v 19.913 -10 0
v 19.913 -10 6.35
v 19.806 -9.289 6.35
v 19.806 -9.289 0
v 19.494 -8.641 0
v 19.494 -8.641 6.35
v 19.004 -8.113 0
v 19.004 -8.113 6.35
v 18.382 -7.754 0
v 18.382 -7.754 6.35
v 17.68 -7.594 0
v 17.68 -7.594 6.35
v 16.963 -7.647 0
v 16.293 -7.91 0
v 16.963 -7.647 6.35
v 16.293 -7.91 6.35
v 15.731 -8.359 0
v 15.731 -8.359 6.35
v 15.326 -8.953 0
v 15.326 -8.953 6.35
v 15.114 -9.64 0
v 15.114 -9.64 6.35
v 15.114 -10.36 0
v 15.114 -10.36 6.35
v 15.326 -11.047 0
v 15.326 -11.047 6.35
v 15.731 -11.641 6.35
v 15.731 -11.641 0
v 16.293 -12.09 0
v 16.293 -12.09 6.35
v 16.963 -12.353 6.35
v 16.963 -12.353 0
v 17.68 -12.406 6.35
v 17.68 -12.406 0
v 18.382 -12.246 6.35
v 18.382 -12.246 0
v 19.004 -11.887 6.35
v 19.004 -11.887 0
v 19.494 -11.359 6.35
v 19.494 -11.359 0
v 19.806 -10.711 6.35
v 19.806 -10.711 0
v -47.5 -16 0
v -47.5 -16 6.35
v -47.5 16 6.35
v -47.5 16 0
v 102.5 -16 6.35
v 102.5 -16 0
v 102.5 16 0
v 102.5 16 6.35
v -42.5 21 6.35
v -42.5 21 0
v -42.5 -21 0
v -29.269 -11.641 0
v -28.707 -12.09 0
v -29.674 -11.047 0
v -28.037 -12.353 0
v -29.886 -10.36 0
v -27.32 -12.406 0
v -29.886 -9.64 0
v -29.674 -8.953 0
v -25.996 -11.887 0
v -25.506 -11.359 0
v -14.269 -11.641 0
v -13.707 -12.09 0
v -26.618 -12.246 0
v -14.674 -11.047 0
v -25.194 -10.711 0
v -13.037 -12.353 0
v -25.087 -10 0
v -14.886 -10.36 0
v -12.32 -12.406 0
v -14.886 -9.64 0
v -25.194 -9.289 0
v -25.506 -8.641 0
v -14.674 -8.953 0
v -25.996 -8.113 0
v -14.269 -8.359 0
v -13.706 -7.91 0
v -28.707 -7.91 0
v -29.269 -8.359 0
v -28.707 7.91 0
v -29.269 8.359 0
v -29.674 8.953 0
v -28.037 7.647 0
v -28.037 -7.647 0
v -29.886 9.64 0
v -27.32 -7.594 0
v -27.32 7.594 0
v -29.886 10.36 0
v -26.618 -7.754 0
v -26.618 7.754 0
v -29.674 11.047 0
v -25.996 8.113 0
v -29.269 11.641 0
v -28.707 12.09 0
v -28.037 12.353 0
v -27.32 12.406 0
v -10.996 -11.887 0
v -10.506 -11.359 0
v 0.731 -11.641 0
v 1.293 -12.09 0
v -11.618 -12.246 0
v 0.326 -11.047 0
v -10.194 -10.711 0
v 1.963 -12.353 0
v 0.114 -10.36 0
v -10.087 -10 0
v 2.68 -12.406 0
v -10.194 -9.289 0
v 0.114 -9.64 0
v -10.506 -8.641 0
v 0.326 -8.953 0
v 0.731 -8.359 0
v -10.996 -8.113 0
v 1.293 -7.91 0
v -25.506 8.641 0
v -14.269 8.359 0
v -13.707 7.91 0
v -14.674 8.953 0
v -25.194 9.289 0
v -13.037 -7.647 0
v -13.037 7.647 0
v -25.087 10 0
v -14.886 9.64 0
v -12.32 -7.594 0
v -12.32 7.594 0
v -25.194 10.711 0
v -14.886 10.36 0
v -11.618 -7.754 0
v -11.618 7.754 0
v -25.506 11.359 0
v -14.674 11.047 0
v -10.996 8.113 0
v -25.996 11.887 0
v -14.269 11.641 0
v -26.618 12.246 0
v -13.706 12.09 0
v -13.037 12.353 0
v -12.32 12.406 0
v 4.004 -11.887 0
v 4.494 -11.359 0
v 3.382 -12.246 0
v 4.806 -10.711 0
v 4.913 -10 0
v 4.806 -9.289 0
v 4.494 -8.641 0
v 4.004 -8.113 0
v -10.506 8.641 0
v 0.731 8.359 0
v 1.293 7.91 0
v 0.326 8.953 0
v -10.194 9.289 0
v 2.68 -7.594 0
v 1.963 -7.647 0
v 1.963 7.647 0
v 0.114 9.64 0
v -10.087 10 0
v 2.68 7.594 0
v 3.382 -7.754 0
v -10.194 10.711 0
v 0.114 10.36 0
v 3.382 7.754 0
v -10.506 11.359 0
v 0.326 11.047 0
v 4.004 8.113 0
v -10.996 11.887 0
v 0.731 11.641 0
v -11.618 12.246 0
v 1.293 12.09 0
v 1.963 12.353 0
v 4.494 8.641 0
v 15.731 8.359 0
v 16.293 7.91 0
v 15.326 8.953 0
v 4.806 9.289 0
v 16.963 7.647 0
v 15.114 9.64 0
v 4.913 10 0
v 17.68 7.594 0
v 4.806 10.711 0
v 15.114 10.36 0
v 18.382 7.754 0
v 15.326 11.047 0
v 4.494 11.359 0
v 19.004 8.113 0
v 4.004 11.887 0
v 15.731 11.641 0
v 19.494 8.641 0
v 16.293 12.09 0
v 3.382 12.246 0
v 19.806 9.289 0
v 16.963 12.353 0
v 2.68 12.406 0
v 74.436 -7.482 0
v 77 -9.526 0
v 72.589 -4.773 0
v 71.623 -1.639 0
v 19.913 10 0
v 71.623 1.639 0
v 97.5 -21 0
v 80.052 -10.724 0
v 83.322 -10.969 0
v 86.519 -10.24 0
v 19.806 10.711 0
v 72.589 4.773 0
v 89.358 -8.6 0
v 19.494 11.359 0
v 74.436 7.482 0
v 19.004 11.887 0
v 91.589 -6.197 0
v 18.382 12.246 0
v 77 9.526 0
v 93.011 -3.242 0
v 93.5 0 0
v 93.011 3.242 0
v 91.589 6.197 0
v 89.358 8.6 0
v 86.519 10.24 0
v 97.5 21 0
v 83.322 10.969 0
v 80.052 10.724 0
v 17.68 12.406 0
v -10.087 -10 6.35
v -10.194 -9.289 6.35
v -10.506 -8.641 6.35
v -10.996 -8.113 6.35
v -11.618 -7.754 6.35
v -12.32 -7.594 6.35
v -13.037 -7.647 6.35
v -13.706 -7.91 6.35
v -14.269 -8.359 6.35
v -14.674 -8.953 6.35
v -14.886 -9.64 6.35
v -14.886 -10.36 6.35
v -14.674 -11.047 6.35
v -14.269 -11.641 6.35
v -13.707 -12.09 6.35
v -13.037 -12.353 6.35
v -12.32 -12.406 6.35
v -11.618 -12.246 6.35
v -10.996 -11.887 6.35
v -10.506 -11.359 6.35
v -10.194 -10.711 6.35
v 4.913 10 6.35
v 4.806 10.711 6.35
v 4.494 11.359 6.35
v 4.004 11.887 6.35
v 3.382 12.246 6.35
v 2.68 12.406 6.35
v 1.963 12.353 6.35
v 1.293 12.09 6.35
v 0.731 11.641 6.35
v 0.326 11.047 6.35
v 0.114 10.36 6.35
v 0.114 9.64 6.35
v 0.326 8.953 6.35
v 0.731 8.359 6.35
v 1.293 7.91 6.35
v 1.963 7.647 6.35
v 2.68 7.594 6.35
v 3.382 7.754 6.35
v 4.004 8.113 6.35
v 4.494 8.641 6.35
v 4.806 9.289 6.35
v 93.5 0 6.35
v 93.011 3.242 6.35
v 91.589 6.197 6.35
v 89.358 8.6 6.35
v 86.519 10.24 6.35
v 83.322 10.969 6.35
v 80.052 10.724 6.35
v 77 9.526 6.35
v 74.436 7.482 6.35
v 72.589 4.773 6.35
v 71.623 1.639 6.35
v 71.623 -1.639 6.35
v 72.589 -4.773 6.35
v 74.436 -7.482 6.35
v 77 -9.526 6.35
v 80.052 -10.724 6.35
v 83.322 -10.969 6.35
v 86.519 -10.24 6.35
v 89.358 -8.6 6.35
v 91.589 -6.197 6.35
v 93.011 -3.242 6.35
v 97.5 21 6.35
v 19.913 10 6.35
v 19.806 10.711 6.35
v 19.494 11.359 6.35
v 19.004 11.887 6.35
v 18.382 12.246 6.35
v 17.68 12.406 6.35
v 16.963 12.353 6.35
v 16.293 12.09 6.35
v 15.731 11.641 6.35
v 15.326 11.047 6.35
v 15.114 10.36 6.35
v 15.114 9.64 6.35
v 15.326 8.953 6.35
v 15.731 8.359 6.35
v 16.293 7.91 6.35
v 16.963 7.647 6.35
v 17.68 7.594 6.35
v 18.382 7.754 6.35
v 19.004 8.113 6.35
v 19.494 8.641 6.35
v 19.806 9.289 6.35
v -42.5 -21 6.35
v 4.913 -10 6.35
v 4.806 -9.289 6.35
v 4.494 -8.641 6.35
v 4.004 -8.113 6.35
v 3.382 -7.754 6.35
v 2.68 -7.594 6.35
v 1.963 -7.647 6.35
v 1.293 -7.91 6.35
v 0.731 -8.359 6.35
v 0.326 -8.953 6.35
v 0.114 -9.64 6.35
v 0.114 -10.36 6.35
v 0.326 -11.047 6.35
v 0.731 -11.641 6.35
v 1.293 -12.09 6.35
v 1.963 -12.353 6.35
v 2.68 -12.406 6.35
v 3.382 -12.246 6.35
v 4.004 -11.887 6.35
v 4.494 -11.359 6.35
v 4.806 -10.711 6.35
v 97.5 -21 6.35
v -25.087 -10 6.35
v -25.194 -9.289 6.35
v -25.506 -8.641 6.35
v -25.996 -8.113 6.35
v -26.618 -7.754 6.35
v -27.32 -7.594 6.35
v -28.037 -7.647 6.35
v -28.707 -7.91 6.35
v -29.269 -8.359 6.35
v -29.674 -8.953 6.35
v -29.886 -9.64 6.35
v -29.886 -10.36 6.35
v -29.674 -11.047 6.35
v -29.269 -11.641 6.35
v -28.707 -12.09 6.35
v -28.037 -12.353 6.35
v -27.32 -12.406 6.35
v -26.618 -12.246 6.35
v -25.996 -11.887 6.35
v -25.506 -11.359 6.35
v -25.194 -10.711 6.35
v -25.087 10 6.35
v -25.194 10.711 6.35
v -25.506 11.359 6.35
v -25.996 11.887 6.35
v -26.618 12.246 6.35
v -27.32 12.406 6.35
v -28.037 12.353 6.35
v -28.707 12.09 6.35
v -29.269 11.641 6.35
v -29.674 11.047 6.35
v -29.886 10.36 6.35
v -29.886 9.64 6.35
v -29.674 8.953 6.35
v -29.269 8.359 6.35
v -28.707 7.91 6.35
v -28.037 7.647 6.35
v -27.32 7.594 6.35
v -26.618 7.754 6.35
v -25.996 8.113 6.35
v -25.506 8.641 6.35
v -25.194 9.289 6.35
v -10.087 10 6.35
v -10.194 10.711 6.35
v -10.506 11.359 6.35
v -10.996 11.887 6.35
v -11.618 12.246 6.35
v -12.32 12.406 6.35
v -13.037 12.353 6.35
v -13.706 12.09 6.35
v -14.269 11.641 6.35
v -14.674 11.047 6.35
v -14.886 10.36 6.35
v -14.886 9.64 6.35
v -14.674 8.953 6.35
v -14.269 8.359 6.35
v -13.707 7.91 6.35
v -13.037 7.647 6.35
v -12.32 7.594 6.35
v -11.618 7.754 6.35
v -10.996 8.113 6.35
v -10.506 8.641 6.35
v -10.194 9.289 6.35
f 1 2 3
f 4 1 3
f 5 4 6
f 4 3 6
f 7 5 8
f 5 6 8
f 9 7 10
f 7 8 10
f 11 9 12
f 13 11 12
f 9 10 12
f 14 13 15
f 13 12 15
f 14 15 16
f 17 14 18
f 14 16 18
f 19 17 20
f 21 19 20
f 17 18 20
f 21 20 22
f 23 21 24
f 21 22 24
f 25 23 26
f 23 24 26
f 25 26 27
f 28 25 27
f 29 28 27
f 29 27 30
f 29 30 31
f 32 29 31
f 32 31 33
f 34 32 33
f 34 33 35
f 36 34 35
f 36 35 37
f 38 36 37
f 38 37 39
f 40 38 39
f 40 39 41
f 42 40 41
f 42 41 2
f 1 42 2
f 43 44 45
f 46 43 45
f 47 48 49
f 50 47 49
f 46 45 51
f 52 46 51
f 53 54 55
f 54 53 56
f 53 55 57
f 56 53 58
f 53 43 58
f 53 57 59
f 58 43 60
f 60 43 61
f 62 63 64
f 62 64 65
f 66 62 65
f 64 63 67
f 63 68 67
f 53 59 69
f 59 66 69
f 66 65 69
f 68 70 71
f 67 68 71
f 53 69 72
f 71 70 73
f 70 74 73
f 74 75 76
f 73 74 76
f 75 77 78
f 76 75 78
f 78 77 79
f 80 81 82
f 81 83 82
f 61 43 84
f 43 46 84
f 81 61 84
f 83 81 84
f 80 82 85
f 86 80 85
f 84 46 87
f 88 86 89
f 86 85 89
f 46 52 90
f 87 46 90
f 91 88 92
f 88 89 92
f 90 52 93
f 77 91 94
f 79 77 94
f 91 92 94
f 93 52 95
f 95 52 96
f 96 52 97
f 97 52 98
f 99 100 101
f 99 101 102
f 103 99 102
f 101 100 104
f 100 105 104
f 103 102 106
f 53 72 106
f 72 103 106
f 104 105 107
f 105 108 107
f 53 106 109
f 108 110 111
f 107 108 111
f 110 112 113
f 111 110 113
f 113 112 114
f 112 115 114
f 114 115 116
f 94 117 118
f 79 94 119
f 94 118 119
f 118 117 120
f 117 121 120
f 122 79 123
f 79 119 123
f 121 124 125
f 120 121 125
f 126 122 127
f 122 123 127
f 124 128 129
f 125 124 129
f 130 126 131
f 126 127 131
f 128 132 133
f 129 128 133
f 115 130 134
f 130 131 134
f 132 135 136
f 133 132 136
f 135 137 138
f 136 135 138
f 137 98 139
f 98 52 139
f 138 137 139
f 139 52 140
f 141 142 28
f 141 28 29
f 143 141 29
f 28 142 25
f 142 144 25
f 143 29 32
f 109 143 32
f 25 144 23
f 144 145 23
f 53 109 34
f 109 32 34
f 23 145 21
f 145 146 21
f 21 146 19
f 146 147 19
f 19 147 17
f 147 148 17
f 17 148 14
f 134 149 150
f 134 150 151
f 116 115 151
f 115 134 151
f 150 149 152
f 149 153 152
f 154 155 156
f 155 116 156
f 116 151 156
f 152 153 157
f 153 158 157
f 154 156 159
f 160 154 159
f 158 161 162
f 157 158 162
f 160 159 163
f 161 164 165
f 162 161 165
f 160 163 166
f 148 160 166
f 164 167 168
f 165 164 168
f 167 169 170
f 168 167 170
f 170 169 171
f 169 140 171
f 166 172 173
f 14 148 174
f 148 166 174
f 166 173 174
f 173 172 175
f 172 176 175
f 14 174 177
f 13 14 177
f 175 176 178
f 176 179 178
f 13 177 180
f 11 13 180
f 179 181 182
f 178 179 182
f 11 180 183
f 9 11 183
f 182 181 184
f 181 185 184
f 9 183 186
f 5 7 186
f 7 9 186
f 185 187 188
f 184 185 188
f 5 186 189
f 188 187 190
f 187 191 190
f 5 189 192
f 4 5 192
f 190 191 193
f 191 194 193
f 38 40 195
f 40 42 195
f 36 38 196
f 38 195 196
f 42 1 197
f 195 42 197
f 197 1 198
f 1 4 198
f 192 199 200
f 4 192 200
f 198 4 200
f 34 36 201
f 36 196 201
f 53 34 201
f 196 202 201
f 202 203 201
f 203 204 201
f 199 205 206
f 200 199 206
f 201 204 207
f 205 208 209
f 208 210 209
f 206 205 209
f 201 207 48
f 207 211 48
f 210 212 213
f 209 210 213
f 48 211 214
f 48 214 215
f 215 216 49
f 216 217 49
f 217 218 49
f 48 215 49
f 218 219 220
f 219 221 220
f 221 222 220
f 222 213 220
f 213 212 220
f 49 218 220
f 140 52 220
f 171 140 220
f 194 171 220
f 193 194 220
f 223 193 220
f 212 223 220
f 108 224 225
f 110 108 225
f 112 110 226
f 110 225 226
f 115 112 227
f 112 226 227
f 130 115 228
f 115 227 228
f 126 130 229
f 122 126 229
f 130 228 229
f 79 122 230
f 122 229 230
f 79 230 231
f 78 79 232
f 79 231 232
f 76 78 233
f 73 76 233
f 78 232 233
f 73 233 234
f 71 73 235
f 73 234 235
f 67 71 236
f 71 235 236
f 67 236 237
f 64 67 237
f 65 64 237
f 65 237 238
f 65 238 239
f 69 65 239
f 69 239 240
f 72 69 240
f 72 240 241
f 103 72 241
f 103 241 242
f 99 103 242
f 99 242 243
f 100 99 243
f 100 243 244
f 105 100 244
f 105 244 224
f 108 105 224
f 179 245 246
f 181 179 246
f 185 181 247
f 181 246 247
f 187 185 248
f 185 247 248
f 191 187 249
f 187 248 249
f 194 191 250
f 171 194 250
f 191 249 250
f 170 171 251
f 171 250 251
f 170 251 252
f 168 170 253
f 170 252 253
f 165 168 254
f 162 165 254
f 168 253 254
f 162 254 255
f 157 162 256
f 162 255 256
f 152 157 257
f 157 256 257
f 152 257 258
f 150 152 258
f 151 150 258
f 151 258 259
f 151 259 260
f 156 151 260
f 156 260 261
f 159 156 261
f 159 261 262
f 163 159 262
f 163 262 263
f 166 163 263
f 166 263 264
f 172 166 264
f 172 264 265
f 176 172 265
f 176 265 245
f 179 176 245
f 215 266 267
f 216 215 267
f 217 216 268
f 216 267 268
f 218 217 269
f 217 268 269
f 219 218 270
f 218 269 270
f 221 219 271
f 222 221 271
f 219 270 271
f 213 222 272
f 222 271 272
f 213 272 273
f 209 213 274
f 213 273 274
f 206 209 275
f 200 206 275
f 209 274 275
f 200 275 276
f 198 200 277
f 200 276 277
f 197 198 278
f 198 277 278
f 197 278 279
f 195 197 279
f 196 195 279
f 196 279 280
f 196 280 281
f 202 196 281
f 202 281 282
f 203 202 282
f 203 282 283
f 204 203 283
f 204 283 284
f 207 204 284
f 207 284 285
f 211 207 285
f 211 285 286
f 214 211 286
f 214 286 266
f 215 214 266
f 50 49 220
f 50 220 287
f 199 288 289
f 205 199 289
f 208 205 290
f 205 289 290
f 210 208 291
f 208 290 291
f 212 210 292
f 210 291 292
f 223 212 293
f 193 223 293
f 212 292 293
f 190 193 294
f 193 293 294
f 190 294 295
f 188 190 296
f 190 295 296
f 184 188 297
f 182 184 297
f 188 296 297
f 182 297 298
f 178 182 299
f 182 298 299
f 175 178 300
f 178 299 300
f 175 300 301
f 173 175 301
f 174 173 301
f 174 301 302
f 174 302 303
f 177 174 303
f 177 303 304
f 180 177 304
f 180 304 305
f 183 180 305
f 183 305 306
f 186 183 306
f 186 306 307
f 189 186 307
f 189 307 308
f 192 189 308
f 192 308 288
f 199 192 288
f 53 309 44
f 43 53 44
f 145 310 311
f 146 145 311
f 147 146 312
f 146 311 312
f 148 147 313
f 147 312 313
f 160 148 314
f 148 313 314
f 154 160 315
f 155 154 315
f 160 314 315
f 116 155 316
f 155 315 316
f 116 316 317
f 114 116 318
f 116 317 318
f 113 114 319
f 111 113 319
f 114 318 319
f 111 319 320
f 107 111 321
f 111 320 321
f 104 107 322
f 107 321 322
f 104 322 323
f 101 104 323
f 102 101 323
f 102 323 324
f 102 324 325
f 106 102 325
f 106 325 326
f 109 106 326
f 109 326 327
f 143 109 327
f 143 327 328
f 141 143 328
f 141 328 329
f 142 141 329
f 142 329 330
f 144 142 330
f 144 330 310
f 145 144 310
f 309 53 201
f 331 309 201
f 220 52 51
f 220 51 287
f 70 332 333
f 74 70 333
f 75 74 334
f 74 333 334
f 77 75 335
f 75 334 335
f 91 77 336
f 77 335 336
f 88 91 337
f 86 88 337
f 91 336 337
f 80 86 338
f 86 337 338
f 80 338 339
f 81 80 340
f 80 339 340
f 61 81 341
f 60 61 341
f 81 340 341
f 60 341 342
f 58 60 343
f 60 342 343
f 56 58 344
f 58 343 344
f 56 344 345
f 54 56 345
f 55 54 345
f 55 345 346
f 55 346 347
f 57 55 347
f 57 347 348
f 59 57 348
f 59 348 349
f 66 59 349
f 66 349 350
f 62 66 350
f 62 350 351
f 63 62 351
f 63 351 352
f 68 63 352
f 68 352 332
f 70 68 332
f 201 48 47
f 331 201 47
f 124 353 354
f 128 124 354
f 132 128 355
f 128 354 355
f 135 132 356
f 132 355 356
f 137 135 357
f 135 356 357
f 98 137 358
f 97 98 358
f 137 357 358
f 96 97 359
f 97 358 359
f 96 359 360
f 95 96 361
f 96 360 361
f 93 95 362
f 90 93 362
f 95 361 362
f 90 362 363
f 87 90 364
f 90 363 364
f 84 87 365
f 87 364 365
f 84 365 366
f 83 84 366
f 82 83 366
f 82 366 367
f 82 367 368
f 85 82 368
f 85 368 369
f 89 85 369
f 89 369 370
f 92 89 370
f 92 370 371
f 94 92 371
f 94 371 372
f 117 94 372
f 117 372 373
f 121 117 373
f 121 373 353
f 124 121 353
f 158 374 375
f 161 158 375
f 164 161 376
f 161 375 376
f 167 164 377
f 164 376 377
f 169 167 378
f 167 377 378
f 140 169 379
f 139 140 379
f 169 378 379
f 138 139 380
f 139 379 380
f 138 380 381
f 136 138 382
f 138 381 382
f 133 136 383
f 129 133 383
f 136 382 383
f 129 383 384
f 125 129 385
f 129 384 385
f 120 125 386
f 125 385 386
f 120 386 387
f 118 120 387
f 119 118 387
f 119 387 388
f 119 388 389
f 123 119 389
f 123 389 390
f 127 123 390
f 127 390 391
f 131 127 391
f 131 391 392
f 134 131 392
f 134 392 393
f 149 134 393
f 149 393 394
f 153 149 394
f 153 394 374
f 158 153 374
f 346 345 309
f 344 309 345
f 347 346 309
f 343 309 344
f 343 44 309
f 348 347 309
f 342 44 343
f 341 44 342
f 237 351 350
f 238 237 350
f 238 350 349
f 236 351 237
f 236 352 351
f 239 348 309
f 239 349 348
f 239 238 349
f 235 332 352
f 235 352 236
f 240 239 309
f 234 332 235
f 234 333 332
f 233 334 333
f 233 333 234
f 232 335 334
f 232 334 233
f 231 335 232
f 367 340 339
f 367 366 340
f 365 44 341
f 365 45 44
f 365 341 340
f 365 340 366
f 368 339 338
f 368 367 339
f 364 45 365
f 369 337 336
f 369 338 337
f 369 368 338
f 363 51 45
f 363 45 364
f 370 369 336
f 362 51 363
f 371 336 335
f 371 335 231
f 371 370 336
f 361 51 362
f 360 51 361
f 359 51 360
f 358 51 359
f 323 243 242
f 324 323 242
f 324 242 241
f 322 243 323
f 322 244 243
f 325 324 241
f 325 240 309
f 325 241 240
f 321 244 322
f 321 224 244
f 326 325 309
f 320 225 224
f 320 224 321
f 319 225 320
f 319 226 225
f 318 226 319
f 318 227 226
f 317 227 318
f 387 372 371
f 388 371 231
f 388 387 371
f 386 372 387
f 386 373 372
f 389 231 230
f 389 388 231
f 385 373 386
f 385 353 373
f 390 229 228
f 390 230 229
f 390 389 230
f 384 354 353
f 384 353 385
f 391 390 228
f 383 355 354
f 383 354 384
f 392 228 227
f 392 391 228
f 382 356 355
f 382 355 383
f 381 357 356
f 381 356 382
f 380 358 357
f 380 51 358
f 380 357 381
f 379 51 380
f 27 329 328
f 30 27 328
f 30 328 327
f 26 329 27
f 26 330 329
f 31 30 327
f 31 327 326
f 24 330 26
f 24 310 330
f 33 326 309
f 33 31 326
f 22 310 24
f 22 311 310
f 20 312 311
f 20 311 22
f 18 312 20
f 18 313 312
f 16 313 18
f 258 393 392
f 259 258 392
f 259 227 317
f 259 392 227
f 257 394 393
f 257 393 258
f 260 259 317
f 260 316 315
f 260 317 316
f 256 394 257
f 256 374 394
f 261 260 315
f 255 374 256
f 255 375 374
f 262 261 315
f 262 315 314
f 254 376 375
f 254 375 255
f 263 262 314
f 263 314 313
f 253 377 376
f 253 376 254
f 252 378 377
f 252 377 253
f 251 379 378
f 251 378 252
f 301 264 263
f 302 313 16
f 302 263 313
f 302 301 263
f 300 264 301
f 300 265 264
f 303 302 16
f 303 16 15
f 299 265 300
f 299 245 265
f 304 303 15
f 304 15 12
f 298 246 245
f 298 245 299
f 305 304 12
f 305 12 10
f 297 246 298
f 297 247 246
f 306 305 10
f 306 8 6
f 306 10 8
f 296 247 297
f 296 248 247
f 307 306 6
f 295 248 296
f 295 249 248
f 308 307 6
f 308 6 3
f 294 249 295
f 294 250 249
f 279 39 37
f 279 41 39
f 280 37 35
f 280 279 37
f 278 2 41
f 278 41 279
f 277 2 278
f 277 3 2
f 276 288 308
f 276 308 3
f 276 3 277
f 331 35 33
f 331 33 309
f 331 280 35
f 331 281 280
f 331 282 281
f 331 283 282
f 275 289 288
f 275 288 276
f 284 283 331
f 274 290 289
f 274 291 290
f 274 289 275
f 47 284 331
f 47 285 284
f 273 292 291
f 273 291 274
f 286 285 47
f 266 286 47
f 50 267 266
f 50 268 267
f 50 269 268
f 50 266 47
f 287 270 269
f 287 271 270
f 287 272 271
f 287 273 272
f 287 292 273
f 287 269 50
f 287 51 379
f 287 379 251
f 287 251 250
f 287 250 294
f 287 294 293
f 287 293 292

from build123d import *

# Parameters (mm, degrees)
SKETCH1_W           = 205
SKETCH1_H           = 42
BOSS_EXTRUDE1_DEPTH = 6.35
SKETCH4_R           = 11
CUT_EXTRUDE3_DEPTH  = 7.35
CHAMFER1_SIZE       = 5
SKETCH9_R           = 11
CUT_EXTRUDE8_DEPTH  = 7.35
SKETCH14_R          = 11
SKETCH14_R_2        = 2.413
CUT_EXTRUDE10_DEPTH = 10


with BuildPart() as part:
    # Sketch1 → Boss-Extrude1 (new body)
    with BuildSketch(Plane.XY):
        Rectangle(SKETCH1_W, SKETCH1_H)
    extrude(amount=BOSS_EXTRUDE1_DEPTH)

    # Sketch4 → Cut-Extrude3 (cut, through all)
    with BuildSketch(Plane.XY.offset(6.35)):
        with Locations((-78.5, 0)):
            Circle(SKETCH4_R)
    extrude(amount=-CUT_EXTRUDE3_DEPTH, mode=Mode.SUBTRACT)

    # Chamfer1
    chamfer1_edges = [part.edges().sort_by_distance(p)[0] for p in [
        (102.5, -21, 3.175),
        (-102.5, -21, 3.175),
        (-102.5, 21, 3.175),
        (102.5, 21, 3.175),
    ]]
    chamfer(chamfer1_edges, length=CHAMFER1_SIZE)

    # Sketch9 → Cut-Extrude8 (cut, through all)
    with BuildSketch(Plane.XY.offset(6.35)):
        with Locations((82.5, 0)):
            Circle(SKETCH9_R)
    extrude(amount=-CUT_EXTRUDE8_DEPTH, mode=Mode.SUBTRACT)

    # Sketch14 → Cut-Extrude10 (cut)
    with BuildSketch(Plane.XY.offset(6.35)):
        Polygon((-47.5, -16), (-47.5, 16), (-42.5, 21), (-97.5, 21), (-102.5, 16), (-102.5, -16), (-97.5, -21), (-42.5, -21), align=None)
        with Locations((-78.5, 0)):
            Circle(SKETCH14_R, mode=Mode.SUBTRACT)
        with Locations((-27.5, 10)):
            Circle(SKETCH14_R_2)
        with Locations((-27.5, -10)):
            Circle(SKETCH14_R_2)
        with Locations((-12.5, -10)):
            Circle(SKETCH14_R_2)
        with Locations((-12.5, 10)):
            Circle(SKETCH14_R_2)
        with Locations((17.5, 10)):
            Circle(SKETCH14_R_2)
        with Locations((2.5, -10)):
            Circle(SKETCH14_R_2)
        with Locations((17.5, -10)):
            Circle(SKETCH14_R_2)
        with Locations((2.5, 10)):
            Circle(SKETCH14_R_2)
    extrude(amount=-CUT_EXTRUDE10_DEPTH, mode=Mode.SUBTRACT)


solid = part.part
